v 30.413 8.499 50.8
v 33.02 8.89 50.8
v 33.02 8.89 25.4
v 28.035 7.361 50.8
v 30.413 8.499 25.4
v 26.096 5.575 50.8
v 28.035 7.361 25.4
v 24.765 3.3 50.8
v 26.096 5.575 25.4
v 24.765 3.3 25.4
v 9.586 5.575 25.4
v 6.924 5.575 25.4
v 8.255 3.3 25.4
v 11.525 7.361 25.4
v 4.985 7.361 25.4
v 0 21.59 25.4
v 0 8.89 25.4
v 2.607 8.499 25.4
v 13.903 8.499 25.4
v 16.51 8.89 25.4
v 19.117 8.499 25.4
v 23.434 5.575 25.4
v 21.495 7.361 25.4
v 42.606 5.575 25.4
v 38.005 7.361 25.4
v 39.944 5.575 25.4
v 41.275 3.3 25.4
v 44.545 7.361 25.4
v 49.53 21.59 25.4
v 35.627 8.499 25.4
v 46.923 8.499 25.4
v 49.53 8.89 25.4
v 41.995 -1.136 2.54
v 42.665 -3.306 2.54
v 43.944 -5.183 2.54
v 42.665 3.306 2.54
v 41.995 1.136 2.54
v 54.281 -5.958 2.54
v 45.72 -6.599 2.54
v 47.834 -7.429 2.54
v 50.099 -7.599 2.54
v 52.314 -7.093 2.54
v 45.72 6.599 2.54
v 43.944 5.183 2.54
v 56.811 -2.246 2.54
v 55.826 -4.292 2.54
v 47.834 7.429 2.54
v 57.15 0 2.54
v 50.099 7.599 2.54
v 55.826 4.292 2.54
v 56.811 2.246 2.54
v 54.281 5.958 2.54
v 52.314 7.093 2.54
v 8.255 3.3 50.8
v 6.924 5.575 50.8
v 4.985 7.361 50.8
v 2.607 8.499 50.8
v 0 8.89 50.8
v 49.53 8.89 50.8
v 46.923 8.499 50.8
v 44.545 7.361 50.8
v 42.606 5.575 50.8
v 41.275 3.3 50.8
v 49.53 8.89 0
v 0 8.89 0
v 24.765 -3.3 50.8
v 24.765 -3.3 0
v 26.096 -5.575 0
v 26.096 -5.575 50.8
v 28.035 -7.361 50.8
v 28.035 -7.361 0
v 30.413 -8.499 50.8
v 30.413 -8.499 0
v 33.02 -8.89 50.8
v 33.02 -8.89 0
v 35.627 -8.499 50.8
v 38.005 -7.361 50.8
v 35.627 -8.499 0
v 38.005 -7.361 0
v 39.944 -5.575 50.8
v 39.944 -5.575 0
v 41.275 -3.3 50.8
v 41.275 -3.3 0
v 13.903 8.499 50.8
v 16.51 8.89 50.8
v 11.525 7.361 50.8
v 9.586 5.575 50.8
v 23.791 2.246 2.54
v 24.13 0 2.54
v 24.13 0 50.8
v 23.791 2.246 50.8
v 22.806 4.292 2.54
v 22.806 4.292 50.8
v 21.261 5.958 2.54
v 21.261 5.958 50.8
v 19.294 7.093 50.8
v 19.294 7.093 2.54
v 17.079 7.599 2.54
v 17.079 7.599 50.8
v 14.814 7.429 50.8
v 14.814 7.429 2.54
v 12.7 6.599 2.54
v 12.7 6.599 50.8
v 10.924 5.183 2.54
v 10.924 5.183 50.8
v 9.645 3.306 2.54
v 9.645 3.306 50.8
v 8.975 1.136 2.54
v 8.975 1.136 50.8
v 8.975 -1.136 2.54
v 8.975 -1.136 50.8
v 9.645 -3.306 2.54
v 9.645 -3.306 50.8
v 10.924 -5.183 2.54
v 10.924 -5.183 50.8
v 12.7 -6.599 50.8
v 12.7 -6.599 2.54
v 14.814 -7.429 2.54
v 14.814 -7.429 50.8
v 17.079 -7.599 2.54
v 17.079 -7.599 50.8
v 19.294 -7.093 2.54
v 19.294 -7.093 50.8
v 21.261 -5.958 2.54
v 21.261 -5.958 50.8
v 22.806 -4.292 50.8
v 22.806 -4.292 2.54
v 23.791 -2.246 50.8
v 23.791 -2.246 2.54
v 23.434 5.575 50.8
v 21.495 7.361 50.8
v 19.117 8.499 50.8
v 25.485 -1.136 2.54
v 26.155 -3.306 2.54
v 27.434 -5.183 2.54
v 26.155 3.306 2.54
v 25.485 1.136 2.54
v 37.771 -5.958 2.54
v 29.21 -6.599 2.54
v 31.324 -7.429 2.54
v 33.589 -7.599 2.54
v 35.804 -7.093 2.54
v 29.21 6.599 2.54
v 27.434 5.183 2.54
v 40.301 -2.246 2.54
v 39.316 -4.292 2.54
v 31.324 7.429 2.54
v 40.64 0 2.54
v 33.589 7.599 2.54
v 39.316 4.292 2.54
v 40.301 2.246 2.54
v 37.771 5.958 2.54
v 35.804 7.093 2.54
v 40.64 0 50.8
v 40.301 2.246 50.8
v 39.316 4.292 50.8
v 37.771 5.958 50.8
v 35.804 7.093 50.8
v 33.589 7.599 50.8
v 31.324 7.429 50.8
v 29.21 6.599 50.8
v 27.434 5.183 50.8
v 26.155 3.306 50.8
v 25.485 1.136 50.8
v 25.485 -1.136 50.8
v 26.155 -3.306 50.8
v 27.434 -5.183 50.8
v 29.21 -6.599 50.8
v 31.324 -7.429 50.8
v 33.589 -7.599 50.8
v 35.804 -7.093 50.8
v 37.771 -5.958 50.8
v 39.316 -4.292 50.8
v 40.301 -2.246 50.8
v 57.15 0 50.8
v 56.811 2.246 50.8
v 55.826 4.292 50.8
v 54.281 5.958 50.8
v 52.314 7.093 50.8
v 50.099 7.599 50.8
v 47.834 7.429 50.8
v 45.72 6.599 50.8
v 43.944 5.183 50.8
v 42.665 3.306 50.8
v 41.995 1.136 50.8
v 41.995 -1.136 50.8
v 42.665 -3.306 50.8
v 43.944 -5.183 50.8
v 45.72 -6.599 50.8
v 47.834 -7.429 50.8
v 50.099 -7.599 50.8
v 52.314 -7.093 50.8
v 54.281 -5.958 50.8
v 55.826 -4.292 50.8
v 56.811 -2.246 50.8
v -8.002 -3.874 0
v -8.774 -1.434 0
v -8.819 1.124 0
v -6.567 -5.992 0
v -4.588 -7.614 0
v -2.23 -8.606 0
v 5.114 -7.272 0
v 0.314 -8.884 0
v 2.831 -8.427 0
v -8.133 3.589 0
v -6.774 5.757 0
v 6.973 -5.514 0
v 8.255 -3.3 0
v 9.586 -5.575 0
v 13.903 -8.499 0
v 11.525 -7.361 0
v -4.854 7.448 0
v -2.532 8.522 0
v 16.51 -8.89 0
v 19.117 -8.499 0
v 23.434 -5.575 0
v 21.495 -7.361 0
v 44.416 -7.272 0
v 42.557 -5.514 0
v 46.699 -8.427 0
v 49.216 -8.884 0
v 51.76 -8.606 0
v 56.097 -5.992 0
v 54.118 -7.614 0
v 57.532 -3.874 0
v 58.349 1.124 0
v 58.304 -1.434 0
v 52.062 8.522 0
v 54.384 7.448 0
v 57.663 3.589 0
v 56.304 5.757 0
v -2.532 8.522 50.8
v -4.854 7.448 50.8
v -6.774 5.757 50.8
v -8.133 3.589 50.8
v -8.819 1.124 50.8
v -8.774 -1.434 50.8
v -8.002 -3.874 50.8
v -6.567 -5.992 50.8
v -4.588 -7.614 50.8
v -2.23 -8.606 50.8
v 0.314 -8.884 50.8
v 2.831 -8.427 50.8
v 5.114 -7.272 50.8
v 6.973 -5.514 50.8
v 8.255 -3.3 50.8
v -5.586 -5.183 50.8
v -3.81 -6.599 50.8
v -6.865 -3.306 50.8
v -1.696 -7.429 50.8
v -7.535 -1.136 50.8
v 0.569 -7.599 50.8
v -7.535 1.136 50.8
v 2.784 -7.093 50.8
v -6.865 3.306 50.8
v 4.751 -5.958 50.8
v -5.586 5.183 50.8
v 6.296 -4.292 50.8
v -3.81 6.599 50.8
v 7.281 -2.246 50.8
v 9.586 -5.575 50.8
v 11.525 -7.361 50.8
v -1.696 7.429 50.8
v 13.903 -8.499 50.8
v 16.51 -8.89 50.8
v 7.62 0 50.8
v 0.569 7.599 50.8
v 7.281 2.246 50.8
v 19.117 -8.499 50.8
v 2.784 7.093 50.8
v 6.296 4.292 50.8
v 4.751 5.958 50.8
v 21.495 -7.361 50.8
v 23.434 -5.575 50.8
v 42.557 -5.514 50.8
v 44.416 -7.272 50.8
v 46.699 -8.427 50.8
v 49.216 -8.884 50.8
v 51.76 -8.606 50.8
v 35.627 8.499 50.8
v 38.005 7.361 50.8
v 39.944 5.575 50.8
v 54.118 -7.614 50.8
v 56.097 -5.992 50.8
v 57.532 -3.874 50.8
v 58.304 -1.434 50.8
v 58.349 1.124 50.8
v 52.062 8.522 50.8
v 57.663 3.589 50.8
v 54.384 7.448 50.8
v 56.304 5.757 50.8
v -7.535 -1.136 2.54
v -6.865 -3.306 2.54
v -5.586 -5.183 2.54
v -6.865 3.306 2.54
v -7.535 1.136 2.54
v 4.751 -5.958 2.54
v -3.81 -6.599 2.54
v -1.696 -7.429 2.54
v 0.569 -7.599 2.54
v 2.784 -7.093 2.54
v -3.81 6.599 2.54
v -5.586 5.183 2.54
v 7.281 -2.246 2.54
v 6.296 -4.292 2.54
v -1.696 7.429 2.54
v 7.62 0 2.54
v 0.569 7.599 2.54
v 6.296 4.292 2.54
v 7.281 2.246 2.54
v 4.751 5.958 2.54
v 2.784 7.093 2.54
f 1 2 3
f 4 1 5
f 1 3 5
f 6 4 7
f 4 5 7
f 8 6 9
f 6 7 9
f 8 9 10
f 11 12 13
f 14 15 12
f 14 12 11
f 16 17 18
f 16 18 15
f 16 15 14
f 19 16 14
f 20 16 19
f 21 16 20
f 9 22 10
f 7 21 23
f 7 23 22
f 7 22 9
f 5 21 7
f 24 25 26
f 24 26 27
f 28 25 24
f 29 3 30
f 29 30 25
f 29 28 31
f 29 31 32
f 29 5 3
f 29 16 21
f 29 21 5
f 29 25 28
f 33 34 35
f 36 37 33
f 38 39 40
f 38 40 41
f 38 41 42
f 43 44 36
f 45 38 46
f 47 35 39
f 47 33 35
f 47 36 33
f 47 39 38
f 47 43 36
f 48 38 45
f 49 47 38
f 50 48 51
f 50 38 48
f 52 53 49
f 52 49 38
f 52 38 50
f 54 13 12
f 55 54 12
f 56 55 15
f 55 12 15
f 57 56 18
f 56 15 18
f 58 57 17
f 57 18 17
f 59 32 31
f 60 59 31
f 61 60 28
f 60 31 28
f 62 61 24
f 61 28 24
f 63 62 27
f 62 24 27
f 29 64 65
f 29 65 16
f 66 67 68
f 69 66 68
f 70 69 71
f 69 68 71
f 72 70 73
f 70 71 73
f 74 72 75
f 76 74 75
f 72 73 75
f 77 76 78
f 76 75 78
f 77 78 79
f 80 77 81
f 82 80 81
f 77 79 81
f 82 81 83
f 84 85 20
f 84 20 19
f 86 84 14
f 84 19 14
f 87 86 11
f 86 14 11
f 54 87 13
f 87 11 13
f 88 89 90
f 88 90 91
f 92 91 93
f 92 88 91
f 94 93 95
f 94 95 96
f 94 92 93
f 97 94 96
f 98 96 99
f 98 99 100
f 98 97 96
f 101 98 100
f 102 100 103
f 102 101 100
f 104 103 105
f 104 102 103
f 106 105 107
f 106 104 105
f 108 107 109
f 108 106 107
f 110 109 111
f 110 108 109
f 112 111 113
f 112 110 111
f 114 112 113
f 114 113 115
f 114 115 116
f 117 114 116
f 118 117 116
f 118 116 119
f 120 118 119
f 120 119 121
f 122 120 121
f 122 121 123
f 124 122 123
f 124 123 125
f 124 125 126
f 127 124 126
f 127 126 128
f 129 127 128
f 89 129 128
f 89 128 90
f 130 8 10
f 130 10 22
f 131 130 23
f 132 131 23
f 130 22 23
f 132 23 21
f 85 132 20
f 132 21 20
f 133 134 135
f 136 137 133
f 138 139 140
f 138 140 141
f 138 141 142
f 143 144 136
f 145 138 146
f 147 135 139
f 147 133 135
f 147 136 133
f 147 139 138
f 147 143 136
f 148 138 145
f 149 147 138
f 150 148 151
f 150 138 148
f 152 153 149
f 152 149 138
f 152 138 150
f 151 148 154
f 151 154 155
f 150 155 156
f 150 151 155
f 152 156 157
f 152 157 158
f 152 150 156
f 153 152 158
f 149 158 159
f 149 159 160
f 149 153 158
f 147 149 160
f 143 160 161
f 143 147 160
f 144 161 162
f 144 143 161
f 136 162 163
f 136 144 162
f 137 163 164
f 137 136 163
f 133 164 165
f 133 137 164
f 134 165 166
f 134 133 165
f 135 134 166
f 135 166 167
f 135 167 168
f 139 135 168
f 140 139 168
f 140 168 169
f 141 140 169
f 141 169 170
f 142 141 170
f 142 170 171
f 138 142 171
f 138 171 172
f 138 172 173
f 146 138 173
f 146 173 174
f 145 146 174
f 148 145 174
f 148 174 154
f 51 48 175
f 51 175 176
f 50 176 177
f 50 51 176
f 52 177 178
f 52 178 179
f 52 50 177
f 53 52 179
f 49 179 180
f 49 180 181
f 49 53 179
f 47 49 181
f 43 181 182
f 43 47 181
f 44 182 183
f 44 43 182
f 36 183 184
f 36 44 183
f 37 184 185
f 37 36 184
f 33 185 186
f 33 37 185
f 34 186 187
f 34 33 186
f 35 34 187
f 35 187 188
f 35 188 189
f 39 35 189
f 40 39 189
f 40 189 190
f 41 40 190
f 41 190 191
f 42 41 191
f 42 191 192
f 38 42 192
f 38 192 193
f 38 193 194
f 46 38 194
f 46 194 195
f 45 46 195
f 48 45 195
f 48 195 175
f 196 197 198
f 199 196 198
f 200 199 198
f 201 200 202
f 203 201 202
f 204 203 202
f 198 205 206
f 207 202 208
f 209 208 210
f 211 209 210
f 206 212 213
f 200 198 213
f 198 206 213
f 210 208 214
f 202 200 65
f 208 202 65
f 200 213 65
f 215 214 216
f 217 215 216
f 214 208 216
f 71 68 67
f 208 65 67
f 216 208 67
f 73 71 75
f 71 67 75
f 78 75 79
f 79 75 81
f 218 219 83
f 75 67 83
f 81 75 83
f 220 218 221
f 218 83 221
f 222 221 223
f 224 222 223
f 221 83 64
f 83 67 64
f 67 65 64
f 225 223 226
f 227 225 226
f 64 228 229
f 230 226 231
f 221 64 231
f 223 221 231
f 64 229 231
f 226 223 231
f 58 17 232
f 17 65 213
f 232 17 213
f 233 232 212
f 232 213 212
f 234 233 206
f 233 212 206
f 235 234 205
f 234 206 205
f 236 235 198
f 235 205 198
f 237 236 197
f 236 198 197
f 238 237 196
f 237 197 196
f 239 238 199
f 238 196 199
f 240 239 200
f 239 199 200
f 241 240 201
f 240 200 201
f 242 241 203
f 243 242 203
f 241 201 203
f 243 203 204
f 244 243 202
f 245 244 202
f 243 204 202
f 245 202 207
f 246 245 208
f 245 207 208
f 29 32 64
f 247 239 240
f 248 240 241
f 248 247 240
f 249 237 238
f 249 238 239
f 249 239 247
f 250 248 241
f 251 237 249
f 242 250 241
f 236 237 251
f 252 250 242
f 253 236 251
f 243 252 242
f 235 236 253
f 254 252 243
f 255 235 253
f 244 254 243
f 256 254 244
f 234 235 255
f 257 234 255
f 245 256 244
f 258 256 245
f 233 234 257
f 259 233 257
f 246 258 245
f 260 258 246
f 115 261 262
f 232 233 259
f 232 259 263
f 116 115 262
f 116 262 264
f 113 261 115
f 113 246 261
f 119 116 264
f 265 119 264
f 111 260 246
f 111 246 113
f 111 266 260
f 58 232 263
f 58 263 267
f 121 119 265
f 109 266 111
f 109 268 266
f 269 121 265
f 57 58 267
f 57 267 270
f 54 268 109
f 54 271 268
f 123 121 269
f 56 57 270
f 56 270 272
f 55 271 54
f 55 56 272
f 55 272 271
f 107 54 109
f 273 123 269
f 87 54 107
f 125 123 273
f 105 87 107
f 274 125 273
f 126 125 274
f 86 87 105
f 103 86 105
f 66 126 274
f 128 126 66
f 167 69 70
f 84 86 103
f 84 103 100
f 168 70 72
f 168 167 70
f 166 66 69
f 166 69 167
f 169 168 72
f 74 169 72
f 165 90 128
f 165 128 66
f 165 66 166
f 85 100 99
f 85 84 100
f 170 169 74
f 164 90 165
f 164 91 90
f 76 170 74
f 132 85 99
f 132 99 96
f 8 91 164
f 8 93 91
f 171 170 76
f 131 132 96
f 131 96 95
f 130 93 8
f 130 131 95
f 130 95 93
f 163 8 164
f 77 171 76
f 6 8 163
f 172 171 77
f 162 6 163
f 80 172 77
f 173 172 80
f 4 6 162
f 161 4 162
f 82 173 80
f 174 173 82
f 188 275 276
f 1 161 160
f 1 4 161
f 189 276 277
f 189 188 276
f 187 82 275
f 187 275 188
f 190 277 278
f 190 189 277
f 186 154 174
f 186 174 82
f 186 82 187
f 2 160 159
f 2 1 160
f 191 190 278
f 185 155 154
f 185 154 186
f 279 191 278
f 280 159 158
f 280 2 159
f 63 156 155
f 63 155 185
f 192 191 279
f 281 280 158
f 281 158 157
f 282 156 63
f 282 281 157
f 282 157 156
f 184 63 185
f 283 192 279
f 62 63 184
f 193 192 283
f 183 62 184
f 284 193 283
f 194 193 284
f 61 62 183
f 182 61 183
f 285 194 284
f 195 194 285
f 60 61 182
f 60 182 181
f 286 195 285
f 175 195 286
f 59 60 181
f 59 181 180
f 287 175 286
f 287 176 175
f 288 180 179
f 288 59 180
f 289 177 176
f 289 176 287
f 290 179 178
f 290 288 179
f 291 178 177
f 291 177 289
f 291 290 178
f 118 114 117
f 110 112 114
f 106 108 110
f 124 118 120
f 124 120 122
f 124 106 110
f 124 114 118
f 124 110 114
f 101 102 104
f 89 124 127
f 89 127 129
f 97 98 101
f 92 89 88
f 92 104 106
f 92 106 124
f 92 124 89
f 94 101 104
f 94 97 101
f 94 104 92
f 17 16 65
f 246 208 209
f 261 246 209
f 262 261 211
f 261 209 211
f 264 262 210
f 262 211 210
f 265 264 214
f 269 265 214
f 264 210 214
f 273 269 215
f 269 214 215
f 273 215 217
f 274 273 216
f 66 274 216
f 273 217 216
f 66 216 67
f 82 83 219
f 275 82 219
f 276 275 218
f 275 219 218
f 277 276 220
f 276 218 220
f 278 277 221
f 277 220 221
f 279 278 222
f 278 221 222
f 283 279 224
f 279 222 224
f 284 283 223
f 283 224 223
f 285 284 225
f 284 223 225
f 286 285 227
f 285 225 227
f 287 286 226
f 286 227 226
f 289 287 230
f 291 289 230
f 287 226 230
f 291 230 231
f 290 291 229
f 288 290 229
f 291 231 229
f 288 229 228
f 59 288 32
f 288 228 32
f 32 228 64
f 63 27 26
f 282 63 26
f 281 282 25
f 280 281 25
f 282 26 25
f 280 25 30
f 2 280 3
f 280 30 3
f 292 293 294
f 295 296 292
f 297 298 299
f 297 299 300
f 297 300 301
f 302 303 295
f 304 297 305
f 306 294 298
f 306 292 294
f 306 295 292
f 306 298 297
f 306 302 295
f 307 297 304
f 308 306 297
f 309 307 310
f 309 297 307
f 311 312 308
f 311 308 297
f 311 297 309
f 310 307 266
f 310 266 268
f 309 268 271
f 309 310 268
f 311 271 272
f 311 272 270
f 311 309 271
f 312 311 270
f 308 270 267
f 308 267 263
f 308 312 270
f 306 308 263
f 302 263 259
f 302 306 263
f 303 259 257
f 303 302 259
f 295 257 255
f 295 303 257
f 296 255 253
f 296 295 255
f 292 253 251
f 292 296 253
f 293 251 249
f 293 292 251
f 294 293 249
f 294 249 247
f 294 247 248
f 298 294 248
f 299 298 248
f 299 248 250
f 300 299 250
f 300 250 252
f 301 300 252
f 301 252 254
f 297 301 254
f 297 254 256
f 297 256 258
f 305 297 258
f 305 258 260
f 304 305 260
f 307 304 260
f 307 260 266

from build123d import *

# Parameters (mm, degrees)
F0_R     = 7.62
F1_DEPTH = 50.8
F2_DEPTH = 25.4
F4_DEPTH = 61.468
F5_DEPTH = 2.54


with BuildPart() as f1:
    # F0 (on Top) → F1 (new body)
    with BuildSketch(Plane.XY):
        with BuildLine():
            ThreePointArc((16.51, 8.89), (11.525071, 7.360882), (8.255, 3.299557))
            ThreePointArc((8.255, 3.299557), (4.984929, 7.360882), (0, 8.89))
            ThreePointArc((0, 8.89), (-7.360882, -4.984929), (8.255, -3.299557))
            ThreePointArc((8.255, -3.299557), (16.51, -8.89), (24.765, -3.299557))
            ThreePointArc((24.765, -3.299557), (33.02, -8.89), (41.275, -3.299557))
            ThreePointArc((41.275, -3.299557), (56.890882, -4.984929), (49.53, 8.89))
            ThreePointArc((49.53, 8.89), (44.545071, 7.360882), (41.275, 3.299557))
            ThreePointArc((41.275, 3.299557), (38.004929, 7.360882), (33.02, 8.89))
            ThreePointArc((33.02, 8.89), (28.035071, 7.360882), (24.765, 3.299557))
            ThreePointArc((24.765, 3.299557), (21.494929, 7.360882), (16.51, 8.89))
        make_face()
        Circle(F0_R, mode=Mode.SUBTRACT)
        with Locations((16.51, 0)):
            Circle(F0_R, mode=Mode.SUBTRACT)
        with Locations((33.02, 0)):
            Circle(F0_R, mode=Mode.SUBTRACT)
        with Locations((49.53, 0)):
            Circle(F0_R, mode=Mode.SUBTRACT)
    extrude(amount=F1_DEPTH)

    # F0 (on Top) → F2 (join)
    with BuildSketch(Plane.XY):
        with BuildLine():
            Line((49.53, 8.89), (33.02, 8.89))
            ThreePointArc((33.02, 8.89), (38.004929, 7.360882), (41.275, 3.299557))
            ThreePointArc((41.275, 3.299557), (44.545071, 7.360882), (49.53, 8.89))
        make_face()
        with BuildLine():
            Line((33.02, 8.89), (16.51, 8.89))
            ThreePointArc((16.51, 8.89), (21.494929, 7.360882), (24.765, 3.299557))
            ThreePointArc((24.765, 3.299557), (28.035071, 7.360882), (33.02, 8.89))
        make_face()
        with BuildLine():
            ThreePointArc((0, 8.89), (4.984929, 7.360882), (8.255, 3.299557))
            ThreePointArc((8.255, 3.299557), (11.525071, 7.360882), (16.51, 8.89))
            Line((16.51, 8.89), (0, 8.89))
        make_face()
        Polygon((0, 21.59), (0, 8.89), (16.51, 8.89), (33.02, 8.89), (49.53, 8.89), (49.53, 21.59), align=None)
    extrude(amount=F2_DEPTH)

    # F3 (on face) → F4 (cut)
    with BuildSketch(Plane(origin=(0, 0, 0), x_dir=(0, -1, 0), z_dir=(-1, 0, 0))):
        Polygon((-8.89, 0), (-21.59, 25.4), (-21.59, 0), align=None)
    extrude(amount=-F4_DEPTH, mode=Mode.SUBTRACT)

    # F0 (on Top) → F5 (join)
    with BuildSketch(Plane.XY):
        Circle(F0_R)
        with Locations((16.51, 0)):
            Circle(F0_R)
        with Locations((33.02, 0)):
            Circle(F0_R)
        with Locations((49.53, 0)):
            Circle(F0_R)
    extrude(amount=F5_DEPTH)


solid = f1.part
